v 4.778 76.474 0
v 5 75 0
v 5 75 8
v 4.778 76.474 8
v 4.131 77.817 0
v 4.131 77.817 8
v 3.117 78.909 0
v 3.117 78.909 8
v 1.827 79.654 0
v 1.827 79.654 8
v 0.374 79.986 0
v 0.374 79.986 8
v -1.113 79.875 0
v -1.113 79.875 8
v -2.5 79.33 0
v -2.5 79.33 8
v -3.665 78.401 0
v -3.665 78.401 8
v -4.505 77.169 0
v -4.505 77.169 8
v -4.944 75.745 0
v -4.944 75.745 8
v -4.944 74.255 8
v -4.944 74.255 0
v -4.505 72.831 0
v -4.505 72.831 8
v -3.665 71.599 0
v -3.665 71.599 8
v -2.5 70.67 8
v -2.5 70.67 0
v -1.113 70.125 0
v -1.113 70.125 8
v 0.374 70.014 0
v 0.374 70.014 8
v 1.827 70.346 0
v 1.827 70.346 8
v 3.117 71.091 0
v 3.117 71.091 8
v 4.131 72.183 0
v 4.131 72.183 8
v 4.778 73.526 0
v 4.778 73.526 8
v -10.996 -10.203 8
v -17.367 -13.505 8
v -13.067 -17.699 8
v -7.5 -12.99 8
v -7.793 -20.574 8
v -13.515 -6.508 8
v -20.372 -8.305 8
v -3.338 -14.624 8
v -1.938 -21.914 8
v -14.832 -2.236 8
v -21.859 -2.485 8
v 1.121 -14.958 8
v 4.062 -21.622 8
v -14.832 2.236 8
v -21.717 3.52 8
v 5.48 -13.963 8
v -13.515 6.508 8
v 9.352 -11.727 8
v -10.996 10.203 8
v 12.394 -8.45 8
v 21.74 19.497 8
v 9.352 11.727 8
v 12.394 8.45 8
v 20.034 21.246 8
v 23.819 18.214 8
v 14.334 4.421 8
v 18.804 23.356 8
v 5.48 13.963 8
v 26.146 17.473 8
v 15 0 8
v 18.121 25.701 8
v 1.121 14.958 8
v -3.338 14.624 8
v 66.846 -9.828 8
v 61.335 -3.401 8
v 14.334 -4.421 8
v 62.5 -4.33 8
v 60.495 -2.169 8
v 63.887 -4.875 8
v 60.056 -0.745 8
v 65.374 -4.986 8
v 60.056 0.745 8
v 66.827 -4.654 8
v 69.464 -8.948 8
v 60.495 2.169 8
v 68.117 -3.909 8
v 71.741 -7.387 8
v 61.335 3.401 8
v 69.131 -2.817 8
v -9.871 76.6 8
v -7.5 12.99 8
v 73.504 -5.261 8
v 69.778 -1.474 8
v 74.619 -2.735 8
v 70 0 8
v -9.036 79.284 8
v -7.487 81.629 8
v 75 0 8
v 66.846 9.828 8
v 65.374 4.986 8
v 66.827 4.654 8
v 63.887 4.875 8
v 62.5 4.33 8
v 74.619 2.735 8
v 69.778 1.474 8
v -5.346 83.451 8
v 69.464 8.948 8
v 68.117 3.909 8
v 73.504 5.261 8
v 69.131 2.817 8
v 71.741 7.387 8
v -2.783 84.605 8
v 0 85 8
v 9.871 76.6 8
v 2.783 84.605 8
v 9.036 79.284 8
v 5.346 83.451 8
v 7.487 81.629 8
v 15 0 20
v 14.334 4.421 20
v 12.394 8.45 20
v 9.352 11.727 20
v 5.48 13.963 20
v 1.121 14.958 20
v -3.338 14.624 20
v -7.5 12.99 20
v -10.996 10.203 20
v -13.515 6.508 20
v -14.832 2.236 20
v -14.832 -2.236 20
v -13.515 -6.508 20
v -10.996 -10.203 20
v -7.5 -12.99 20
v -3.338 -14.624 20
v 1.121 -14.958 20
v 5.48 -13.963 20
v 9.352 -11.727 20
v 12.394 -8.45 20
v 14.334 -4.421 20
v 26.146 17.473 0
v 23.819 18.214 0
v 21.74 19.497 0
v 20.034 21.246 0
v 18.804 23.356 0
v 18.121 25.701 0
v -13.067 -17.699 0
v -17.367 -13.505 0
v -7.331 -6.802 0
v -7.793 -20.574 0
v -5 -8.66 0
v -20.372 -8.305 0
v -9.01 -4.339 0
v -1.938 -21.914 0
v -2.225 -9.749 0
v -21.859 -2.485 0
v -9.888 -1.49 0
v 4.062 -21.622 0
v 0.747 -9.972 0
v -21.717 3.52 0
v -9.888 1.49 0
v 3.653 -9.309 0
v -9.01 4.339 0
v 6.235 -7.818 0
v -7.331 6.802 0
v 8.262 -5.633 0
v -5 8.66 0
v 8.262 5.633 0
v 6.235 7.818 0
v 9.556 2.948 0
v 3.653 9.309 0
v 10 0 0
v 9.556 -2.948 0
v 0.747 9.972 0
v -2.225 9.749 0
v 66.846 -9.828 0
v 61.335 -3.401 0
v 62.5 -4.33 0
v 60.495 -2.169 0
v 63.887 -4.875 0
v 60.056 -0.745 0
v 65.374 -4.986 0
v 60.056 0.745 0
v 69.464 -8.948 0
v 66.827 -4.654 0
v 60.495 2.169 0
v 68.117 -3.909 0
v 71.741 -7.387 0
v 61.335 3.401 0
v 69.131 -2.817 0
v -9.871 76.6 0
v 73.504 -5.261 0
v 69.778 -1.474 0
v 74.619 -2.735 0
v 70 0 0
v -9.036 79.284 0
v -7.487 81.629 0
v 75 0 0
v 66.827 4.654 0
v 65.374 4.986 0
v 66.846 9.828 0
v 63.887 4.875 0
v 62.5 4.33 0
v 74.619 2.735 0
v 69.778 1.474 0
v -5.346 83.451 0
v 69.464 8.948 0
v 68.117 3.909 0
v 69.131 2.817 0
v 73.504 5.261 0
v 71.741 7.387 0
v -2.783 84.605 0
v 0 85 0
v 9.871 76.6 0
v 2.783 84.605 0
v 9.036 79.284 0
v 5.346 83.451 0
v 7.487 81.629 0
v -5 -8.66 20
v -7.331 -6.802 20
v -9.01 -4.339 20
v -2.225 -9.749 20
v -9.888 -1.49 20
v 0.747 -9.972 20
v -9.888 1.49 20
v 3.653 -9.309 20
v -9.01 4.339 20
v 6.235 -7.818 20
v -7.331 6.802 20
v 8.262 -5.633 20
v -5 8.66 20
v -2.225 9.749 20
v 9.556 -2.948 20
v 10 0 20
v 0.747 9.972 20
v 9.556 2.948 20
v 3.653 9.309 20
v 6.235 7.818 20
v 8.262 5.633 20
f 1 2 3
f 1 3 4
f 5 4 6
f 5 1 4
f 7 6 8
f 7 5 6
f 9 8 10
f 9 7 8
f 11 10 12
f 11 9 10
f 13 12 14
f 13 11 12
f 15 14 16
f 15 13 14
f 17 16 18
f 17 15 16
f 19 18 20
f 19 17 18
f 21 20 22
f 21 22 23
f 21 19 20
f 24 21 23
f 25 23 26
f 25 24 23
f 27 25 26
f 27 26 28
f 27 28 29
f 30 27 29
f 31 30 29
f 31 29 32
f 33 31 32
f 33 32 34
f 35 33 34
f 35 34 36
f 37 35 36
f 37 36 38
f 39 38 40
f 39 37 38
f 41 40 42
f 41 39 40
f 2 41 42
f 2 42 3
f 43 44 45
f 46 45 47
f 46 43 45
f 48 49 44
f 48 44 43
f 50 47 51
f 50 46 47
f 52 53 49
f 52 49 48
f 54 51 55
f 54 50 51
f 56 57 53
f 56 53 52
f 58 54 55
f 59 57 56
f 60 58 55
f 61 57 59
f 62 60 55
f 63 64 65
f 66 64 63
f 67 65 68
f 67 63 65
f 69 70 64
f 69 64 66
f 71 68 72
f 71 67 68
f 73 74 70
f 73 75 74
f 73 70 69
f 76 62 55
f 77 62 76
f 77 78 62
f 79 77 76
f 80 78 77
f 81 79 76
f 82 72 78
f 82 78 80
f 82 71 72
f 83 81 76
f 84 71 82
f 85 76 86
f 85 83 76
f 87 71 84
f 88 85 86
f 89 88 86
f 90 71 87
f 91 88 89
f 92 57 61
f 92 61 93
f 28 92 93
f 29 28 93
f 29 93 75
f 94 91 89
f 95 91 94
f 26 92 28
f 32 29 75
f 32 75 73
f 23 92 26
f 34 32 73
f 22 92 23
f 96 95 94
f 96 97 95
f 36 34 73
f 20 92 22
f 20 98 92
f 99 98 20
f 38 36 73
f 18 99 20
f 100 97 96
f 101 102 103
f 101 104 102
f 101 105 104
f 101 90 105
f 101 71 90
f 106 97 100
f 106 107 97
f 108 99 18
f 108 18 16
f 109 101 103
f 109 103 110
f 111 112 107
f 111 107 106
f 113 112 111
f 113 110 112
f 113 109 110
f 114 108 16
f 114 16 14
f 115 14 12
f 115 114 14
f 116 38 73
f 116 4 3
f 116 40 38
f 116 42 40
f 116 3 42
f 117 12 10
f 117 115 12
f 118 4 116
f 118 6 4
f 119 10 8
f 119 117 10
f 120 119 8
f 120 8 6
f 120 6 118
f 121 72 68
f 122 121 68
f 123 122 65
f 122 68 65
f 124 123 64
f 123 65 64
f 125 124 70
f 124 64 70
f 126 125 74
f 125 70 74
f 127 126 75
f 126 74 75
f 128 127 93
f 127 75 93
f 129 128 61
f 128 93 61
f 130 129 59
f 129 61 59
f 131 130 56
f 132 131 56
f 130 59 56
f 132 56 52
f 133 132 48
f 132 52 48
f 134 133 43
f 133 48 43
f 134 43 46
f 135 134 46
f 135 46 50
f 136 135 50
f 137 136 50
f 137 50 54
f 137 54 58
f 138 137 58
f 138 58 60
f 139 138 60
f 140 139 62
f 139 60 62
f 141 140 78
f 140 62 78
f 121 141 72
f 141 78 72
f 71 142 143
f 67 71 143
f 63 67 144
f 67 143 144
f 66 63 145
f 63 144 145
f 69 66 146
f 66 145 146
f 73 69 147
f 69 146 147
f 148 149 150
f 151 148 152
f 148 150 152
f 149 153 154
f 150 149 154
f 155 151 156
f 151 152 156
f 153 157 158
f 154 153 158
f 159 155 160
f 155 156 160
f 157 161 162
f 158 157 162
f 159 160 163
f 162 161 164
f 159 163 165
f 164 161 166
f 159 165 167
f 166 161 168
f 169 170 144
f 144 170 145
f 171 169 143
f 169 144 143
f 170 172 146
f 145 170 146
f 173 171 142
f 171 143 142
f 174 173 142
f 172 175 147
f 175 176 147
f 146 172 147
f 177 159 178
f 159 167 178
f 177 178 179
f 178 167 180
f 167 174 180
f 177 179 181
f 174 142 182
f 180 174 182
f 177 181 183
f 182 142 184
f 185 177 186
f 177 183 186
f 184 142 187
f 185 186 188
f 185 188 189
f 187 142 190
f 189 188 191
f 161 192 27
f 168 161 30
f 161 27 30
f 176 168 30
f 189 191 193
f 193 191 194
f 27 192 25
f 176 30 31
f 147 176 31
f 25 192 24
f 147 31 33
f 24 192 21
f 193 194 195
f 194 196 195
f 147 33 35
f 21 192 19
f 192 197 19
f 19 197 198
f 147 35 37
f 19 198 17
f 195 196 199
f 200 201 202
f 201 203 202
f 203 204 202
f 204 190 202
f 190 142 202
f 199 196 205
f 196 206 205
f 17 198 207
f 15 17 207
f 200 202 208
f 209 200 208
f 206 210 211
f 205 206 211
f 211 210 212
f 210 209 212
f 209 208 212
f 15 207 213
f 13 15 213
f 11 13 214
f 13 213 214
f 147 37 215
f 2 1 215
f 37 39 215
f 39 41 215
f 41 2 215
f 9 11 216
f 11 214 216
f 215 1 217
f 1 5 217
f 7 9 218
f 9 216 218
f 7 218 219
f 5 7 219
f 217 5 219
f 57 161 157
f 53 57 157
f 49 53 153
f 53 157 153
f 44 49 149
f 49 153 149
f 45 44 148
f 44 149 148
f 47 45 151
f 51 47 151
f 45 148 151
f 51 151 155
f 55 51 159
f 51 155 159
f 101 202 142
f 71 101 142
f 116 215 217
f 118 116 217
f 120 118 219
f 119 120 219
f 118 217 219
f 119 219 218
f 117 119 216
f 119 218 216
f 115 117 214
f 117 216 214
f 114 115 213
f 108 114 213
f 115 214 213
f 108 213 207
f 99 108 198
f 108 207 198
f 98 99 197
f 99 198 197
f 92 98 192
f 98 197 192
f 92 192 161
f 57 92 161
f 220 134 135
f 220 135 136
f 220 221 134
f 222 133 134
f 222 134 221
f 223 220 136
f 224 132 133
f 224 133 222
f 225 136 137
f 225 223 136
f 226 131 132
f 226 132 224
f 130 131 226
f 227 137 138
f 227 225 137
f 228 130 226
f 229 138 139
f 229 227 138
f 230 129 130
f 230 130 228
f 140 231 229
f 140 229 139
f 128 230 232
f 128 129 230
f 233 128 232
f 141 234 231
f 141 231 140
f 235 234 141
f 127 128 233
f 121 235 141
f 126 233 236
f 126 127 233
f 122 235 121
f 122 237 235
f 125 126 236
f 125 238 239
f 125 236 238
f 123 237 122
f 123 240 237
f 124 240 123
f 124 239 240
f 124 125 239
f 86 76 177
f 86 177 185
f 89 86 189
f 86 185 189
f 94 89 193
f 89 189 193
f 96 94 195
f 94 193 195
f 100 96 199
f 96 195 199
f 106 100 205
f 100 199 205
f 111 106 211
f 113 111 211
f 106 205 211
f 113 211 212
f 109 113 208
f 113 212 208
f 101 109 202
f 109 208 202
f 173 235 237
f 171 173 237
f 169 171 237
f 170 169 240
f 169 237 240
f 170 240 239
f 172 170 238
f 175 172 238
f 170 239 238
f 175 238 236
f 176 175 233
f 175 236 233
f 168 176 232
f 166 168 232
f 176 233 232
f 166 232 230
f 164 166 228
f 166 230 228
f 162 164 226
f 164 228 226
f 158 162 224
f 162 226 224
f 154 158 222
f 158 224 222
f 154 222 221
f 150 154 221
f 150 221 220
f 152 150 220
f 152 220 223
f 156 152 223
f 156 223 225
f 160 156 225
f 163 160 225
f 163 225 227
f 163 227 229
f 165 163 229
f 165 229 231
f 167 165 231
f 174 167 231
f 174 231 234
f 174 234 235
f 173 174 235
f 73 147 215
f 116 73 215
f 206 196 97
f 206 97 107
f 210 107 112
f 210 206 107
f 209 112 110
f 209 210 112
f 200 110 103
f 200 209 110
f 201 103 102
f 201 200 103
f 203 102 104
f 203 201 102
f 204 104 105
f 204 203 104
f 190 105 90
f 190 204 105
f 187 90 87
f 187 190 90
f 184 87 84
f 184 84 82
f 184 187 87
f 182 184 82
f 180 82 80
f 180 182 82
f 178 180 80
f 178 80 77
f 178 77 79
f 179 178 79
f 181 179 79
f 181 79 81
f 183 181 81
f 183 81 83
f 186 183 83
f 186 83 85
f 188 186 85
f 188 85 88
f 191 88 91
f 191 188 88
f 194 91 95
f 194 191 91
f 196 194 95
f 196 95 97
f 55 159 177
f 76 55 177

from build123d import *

# Parameters (mm, degrees)
SKETCH1_R           = 5
BOSS_EXTRUDE1_DEPTH = 8
SKETCH2_R           = 15
BOSS_EXTRUDE2_DEPTH = 12
SKETCH3_R           = 10
CUT_EXTRUDE1_DEPTH  = 21


with BuildPart() as part:
    # Sketch1 → Boss-Extrude1 (new body)
    with BuildSketch(Plane.XY):
        with BuildLine():
            Line((-9.871170143, 76.6), (-21.716574315, 3.52))
            ThreePointArc((-21.716574315, 3.52), (-15.360764468, -15.749505229), (4.061538462, -21.62183862))
            Line((4.061538462, -21.62183862), (66.846153846, -9.828108464))
            ThreePointArc((66.846153846, -9.828108464), (75, 0), (66.846153846, 9.828108464))
            Line((66.846153846, 9.828108464), (26.146237666, 17.473354451))
            ThreePointArc((26.146237666, 17.473354451), (20.833525499, 20.319297247), (18.121221369, 25.701462915))
            Line((18.121221369, 25.701462915), (9.871170143, 76.6))
            ThreePointArc((9.871170143, 76.6), (0, 85), (-9.871170143, 76.6))
        make_face()
        with Locations((0, 75)):
            Circle(SKETCH1_R, mode=Mode.SUBTRACT)
        with Locations((65, 0)):
            Circle(SKETCH1_R, mode=Mode.SUBTRACT)
    extrude(amount=BOSS_EXTRUDE1_DEPTH)

    # Sketch2 → Boss-Extrude2 (add)
    with BuildSketch(Plane.XY.offset(8)):
        Circle(SKETCH2_R)
    extrude(amount=BOSS_EXTRUDE2_DEPTH)

    # Sketch3 → Cut-Extrude1 (cut, through all)
    with BuildSketch(Plane.XY.offset(20)):
        Circle(SKETCH3_R)
    extrude(amount=-CUT_EXTRUDE1_DEPTH, mode=Mode.SUBTRACT)


solid = part.part
